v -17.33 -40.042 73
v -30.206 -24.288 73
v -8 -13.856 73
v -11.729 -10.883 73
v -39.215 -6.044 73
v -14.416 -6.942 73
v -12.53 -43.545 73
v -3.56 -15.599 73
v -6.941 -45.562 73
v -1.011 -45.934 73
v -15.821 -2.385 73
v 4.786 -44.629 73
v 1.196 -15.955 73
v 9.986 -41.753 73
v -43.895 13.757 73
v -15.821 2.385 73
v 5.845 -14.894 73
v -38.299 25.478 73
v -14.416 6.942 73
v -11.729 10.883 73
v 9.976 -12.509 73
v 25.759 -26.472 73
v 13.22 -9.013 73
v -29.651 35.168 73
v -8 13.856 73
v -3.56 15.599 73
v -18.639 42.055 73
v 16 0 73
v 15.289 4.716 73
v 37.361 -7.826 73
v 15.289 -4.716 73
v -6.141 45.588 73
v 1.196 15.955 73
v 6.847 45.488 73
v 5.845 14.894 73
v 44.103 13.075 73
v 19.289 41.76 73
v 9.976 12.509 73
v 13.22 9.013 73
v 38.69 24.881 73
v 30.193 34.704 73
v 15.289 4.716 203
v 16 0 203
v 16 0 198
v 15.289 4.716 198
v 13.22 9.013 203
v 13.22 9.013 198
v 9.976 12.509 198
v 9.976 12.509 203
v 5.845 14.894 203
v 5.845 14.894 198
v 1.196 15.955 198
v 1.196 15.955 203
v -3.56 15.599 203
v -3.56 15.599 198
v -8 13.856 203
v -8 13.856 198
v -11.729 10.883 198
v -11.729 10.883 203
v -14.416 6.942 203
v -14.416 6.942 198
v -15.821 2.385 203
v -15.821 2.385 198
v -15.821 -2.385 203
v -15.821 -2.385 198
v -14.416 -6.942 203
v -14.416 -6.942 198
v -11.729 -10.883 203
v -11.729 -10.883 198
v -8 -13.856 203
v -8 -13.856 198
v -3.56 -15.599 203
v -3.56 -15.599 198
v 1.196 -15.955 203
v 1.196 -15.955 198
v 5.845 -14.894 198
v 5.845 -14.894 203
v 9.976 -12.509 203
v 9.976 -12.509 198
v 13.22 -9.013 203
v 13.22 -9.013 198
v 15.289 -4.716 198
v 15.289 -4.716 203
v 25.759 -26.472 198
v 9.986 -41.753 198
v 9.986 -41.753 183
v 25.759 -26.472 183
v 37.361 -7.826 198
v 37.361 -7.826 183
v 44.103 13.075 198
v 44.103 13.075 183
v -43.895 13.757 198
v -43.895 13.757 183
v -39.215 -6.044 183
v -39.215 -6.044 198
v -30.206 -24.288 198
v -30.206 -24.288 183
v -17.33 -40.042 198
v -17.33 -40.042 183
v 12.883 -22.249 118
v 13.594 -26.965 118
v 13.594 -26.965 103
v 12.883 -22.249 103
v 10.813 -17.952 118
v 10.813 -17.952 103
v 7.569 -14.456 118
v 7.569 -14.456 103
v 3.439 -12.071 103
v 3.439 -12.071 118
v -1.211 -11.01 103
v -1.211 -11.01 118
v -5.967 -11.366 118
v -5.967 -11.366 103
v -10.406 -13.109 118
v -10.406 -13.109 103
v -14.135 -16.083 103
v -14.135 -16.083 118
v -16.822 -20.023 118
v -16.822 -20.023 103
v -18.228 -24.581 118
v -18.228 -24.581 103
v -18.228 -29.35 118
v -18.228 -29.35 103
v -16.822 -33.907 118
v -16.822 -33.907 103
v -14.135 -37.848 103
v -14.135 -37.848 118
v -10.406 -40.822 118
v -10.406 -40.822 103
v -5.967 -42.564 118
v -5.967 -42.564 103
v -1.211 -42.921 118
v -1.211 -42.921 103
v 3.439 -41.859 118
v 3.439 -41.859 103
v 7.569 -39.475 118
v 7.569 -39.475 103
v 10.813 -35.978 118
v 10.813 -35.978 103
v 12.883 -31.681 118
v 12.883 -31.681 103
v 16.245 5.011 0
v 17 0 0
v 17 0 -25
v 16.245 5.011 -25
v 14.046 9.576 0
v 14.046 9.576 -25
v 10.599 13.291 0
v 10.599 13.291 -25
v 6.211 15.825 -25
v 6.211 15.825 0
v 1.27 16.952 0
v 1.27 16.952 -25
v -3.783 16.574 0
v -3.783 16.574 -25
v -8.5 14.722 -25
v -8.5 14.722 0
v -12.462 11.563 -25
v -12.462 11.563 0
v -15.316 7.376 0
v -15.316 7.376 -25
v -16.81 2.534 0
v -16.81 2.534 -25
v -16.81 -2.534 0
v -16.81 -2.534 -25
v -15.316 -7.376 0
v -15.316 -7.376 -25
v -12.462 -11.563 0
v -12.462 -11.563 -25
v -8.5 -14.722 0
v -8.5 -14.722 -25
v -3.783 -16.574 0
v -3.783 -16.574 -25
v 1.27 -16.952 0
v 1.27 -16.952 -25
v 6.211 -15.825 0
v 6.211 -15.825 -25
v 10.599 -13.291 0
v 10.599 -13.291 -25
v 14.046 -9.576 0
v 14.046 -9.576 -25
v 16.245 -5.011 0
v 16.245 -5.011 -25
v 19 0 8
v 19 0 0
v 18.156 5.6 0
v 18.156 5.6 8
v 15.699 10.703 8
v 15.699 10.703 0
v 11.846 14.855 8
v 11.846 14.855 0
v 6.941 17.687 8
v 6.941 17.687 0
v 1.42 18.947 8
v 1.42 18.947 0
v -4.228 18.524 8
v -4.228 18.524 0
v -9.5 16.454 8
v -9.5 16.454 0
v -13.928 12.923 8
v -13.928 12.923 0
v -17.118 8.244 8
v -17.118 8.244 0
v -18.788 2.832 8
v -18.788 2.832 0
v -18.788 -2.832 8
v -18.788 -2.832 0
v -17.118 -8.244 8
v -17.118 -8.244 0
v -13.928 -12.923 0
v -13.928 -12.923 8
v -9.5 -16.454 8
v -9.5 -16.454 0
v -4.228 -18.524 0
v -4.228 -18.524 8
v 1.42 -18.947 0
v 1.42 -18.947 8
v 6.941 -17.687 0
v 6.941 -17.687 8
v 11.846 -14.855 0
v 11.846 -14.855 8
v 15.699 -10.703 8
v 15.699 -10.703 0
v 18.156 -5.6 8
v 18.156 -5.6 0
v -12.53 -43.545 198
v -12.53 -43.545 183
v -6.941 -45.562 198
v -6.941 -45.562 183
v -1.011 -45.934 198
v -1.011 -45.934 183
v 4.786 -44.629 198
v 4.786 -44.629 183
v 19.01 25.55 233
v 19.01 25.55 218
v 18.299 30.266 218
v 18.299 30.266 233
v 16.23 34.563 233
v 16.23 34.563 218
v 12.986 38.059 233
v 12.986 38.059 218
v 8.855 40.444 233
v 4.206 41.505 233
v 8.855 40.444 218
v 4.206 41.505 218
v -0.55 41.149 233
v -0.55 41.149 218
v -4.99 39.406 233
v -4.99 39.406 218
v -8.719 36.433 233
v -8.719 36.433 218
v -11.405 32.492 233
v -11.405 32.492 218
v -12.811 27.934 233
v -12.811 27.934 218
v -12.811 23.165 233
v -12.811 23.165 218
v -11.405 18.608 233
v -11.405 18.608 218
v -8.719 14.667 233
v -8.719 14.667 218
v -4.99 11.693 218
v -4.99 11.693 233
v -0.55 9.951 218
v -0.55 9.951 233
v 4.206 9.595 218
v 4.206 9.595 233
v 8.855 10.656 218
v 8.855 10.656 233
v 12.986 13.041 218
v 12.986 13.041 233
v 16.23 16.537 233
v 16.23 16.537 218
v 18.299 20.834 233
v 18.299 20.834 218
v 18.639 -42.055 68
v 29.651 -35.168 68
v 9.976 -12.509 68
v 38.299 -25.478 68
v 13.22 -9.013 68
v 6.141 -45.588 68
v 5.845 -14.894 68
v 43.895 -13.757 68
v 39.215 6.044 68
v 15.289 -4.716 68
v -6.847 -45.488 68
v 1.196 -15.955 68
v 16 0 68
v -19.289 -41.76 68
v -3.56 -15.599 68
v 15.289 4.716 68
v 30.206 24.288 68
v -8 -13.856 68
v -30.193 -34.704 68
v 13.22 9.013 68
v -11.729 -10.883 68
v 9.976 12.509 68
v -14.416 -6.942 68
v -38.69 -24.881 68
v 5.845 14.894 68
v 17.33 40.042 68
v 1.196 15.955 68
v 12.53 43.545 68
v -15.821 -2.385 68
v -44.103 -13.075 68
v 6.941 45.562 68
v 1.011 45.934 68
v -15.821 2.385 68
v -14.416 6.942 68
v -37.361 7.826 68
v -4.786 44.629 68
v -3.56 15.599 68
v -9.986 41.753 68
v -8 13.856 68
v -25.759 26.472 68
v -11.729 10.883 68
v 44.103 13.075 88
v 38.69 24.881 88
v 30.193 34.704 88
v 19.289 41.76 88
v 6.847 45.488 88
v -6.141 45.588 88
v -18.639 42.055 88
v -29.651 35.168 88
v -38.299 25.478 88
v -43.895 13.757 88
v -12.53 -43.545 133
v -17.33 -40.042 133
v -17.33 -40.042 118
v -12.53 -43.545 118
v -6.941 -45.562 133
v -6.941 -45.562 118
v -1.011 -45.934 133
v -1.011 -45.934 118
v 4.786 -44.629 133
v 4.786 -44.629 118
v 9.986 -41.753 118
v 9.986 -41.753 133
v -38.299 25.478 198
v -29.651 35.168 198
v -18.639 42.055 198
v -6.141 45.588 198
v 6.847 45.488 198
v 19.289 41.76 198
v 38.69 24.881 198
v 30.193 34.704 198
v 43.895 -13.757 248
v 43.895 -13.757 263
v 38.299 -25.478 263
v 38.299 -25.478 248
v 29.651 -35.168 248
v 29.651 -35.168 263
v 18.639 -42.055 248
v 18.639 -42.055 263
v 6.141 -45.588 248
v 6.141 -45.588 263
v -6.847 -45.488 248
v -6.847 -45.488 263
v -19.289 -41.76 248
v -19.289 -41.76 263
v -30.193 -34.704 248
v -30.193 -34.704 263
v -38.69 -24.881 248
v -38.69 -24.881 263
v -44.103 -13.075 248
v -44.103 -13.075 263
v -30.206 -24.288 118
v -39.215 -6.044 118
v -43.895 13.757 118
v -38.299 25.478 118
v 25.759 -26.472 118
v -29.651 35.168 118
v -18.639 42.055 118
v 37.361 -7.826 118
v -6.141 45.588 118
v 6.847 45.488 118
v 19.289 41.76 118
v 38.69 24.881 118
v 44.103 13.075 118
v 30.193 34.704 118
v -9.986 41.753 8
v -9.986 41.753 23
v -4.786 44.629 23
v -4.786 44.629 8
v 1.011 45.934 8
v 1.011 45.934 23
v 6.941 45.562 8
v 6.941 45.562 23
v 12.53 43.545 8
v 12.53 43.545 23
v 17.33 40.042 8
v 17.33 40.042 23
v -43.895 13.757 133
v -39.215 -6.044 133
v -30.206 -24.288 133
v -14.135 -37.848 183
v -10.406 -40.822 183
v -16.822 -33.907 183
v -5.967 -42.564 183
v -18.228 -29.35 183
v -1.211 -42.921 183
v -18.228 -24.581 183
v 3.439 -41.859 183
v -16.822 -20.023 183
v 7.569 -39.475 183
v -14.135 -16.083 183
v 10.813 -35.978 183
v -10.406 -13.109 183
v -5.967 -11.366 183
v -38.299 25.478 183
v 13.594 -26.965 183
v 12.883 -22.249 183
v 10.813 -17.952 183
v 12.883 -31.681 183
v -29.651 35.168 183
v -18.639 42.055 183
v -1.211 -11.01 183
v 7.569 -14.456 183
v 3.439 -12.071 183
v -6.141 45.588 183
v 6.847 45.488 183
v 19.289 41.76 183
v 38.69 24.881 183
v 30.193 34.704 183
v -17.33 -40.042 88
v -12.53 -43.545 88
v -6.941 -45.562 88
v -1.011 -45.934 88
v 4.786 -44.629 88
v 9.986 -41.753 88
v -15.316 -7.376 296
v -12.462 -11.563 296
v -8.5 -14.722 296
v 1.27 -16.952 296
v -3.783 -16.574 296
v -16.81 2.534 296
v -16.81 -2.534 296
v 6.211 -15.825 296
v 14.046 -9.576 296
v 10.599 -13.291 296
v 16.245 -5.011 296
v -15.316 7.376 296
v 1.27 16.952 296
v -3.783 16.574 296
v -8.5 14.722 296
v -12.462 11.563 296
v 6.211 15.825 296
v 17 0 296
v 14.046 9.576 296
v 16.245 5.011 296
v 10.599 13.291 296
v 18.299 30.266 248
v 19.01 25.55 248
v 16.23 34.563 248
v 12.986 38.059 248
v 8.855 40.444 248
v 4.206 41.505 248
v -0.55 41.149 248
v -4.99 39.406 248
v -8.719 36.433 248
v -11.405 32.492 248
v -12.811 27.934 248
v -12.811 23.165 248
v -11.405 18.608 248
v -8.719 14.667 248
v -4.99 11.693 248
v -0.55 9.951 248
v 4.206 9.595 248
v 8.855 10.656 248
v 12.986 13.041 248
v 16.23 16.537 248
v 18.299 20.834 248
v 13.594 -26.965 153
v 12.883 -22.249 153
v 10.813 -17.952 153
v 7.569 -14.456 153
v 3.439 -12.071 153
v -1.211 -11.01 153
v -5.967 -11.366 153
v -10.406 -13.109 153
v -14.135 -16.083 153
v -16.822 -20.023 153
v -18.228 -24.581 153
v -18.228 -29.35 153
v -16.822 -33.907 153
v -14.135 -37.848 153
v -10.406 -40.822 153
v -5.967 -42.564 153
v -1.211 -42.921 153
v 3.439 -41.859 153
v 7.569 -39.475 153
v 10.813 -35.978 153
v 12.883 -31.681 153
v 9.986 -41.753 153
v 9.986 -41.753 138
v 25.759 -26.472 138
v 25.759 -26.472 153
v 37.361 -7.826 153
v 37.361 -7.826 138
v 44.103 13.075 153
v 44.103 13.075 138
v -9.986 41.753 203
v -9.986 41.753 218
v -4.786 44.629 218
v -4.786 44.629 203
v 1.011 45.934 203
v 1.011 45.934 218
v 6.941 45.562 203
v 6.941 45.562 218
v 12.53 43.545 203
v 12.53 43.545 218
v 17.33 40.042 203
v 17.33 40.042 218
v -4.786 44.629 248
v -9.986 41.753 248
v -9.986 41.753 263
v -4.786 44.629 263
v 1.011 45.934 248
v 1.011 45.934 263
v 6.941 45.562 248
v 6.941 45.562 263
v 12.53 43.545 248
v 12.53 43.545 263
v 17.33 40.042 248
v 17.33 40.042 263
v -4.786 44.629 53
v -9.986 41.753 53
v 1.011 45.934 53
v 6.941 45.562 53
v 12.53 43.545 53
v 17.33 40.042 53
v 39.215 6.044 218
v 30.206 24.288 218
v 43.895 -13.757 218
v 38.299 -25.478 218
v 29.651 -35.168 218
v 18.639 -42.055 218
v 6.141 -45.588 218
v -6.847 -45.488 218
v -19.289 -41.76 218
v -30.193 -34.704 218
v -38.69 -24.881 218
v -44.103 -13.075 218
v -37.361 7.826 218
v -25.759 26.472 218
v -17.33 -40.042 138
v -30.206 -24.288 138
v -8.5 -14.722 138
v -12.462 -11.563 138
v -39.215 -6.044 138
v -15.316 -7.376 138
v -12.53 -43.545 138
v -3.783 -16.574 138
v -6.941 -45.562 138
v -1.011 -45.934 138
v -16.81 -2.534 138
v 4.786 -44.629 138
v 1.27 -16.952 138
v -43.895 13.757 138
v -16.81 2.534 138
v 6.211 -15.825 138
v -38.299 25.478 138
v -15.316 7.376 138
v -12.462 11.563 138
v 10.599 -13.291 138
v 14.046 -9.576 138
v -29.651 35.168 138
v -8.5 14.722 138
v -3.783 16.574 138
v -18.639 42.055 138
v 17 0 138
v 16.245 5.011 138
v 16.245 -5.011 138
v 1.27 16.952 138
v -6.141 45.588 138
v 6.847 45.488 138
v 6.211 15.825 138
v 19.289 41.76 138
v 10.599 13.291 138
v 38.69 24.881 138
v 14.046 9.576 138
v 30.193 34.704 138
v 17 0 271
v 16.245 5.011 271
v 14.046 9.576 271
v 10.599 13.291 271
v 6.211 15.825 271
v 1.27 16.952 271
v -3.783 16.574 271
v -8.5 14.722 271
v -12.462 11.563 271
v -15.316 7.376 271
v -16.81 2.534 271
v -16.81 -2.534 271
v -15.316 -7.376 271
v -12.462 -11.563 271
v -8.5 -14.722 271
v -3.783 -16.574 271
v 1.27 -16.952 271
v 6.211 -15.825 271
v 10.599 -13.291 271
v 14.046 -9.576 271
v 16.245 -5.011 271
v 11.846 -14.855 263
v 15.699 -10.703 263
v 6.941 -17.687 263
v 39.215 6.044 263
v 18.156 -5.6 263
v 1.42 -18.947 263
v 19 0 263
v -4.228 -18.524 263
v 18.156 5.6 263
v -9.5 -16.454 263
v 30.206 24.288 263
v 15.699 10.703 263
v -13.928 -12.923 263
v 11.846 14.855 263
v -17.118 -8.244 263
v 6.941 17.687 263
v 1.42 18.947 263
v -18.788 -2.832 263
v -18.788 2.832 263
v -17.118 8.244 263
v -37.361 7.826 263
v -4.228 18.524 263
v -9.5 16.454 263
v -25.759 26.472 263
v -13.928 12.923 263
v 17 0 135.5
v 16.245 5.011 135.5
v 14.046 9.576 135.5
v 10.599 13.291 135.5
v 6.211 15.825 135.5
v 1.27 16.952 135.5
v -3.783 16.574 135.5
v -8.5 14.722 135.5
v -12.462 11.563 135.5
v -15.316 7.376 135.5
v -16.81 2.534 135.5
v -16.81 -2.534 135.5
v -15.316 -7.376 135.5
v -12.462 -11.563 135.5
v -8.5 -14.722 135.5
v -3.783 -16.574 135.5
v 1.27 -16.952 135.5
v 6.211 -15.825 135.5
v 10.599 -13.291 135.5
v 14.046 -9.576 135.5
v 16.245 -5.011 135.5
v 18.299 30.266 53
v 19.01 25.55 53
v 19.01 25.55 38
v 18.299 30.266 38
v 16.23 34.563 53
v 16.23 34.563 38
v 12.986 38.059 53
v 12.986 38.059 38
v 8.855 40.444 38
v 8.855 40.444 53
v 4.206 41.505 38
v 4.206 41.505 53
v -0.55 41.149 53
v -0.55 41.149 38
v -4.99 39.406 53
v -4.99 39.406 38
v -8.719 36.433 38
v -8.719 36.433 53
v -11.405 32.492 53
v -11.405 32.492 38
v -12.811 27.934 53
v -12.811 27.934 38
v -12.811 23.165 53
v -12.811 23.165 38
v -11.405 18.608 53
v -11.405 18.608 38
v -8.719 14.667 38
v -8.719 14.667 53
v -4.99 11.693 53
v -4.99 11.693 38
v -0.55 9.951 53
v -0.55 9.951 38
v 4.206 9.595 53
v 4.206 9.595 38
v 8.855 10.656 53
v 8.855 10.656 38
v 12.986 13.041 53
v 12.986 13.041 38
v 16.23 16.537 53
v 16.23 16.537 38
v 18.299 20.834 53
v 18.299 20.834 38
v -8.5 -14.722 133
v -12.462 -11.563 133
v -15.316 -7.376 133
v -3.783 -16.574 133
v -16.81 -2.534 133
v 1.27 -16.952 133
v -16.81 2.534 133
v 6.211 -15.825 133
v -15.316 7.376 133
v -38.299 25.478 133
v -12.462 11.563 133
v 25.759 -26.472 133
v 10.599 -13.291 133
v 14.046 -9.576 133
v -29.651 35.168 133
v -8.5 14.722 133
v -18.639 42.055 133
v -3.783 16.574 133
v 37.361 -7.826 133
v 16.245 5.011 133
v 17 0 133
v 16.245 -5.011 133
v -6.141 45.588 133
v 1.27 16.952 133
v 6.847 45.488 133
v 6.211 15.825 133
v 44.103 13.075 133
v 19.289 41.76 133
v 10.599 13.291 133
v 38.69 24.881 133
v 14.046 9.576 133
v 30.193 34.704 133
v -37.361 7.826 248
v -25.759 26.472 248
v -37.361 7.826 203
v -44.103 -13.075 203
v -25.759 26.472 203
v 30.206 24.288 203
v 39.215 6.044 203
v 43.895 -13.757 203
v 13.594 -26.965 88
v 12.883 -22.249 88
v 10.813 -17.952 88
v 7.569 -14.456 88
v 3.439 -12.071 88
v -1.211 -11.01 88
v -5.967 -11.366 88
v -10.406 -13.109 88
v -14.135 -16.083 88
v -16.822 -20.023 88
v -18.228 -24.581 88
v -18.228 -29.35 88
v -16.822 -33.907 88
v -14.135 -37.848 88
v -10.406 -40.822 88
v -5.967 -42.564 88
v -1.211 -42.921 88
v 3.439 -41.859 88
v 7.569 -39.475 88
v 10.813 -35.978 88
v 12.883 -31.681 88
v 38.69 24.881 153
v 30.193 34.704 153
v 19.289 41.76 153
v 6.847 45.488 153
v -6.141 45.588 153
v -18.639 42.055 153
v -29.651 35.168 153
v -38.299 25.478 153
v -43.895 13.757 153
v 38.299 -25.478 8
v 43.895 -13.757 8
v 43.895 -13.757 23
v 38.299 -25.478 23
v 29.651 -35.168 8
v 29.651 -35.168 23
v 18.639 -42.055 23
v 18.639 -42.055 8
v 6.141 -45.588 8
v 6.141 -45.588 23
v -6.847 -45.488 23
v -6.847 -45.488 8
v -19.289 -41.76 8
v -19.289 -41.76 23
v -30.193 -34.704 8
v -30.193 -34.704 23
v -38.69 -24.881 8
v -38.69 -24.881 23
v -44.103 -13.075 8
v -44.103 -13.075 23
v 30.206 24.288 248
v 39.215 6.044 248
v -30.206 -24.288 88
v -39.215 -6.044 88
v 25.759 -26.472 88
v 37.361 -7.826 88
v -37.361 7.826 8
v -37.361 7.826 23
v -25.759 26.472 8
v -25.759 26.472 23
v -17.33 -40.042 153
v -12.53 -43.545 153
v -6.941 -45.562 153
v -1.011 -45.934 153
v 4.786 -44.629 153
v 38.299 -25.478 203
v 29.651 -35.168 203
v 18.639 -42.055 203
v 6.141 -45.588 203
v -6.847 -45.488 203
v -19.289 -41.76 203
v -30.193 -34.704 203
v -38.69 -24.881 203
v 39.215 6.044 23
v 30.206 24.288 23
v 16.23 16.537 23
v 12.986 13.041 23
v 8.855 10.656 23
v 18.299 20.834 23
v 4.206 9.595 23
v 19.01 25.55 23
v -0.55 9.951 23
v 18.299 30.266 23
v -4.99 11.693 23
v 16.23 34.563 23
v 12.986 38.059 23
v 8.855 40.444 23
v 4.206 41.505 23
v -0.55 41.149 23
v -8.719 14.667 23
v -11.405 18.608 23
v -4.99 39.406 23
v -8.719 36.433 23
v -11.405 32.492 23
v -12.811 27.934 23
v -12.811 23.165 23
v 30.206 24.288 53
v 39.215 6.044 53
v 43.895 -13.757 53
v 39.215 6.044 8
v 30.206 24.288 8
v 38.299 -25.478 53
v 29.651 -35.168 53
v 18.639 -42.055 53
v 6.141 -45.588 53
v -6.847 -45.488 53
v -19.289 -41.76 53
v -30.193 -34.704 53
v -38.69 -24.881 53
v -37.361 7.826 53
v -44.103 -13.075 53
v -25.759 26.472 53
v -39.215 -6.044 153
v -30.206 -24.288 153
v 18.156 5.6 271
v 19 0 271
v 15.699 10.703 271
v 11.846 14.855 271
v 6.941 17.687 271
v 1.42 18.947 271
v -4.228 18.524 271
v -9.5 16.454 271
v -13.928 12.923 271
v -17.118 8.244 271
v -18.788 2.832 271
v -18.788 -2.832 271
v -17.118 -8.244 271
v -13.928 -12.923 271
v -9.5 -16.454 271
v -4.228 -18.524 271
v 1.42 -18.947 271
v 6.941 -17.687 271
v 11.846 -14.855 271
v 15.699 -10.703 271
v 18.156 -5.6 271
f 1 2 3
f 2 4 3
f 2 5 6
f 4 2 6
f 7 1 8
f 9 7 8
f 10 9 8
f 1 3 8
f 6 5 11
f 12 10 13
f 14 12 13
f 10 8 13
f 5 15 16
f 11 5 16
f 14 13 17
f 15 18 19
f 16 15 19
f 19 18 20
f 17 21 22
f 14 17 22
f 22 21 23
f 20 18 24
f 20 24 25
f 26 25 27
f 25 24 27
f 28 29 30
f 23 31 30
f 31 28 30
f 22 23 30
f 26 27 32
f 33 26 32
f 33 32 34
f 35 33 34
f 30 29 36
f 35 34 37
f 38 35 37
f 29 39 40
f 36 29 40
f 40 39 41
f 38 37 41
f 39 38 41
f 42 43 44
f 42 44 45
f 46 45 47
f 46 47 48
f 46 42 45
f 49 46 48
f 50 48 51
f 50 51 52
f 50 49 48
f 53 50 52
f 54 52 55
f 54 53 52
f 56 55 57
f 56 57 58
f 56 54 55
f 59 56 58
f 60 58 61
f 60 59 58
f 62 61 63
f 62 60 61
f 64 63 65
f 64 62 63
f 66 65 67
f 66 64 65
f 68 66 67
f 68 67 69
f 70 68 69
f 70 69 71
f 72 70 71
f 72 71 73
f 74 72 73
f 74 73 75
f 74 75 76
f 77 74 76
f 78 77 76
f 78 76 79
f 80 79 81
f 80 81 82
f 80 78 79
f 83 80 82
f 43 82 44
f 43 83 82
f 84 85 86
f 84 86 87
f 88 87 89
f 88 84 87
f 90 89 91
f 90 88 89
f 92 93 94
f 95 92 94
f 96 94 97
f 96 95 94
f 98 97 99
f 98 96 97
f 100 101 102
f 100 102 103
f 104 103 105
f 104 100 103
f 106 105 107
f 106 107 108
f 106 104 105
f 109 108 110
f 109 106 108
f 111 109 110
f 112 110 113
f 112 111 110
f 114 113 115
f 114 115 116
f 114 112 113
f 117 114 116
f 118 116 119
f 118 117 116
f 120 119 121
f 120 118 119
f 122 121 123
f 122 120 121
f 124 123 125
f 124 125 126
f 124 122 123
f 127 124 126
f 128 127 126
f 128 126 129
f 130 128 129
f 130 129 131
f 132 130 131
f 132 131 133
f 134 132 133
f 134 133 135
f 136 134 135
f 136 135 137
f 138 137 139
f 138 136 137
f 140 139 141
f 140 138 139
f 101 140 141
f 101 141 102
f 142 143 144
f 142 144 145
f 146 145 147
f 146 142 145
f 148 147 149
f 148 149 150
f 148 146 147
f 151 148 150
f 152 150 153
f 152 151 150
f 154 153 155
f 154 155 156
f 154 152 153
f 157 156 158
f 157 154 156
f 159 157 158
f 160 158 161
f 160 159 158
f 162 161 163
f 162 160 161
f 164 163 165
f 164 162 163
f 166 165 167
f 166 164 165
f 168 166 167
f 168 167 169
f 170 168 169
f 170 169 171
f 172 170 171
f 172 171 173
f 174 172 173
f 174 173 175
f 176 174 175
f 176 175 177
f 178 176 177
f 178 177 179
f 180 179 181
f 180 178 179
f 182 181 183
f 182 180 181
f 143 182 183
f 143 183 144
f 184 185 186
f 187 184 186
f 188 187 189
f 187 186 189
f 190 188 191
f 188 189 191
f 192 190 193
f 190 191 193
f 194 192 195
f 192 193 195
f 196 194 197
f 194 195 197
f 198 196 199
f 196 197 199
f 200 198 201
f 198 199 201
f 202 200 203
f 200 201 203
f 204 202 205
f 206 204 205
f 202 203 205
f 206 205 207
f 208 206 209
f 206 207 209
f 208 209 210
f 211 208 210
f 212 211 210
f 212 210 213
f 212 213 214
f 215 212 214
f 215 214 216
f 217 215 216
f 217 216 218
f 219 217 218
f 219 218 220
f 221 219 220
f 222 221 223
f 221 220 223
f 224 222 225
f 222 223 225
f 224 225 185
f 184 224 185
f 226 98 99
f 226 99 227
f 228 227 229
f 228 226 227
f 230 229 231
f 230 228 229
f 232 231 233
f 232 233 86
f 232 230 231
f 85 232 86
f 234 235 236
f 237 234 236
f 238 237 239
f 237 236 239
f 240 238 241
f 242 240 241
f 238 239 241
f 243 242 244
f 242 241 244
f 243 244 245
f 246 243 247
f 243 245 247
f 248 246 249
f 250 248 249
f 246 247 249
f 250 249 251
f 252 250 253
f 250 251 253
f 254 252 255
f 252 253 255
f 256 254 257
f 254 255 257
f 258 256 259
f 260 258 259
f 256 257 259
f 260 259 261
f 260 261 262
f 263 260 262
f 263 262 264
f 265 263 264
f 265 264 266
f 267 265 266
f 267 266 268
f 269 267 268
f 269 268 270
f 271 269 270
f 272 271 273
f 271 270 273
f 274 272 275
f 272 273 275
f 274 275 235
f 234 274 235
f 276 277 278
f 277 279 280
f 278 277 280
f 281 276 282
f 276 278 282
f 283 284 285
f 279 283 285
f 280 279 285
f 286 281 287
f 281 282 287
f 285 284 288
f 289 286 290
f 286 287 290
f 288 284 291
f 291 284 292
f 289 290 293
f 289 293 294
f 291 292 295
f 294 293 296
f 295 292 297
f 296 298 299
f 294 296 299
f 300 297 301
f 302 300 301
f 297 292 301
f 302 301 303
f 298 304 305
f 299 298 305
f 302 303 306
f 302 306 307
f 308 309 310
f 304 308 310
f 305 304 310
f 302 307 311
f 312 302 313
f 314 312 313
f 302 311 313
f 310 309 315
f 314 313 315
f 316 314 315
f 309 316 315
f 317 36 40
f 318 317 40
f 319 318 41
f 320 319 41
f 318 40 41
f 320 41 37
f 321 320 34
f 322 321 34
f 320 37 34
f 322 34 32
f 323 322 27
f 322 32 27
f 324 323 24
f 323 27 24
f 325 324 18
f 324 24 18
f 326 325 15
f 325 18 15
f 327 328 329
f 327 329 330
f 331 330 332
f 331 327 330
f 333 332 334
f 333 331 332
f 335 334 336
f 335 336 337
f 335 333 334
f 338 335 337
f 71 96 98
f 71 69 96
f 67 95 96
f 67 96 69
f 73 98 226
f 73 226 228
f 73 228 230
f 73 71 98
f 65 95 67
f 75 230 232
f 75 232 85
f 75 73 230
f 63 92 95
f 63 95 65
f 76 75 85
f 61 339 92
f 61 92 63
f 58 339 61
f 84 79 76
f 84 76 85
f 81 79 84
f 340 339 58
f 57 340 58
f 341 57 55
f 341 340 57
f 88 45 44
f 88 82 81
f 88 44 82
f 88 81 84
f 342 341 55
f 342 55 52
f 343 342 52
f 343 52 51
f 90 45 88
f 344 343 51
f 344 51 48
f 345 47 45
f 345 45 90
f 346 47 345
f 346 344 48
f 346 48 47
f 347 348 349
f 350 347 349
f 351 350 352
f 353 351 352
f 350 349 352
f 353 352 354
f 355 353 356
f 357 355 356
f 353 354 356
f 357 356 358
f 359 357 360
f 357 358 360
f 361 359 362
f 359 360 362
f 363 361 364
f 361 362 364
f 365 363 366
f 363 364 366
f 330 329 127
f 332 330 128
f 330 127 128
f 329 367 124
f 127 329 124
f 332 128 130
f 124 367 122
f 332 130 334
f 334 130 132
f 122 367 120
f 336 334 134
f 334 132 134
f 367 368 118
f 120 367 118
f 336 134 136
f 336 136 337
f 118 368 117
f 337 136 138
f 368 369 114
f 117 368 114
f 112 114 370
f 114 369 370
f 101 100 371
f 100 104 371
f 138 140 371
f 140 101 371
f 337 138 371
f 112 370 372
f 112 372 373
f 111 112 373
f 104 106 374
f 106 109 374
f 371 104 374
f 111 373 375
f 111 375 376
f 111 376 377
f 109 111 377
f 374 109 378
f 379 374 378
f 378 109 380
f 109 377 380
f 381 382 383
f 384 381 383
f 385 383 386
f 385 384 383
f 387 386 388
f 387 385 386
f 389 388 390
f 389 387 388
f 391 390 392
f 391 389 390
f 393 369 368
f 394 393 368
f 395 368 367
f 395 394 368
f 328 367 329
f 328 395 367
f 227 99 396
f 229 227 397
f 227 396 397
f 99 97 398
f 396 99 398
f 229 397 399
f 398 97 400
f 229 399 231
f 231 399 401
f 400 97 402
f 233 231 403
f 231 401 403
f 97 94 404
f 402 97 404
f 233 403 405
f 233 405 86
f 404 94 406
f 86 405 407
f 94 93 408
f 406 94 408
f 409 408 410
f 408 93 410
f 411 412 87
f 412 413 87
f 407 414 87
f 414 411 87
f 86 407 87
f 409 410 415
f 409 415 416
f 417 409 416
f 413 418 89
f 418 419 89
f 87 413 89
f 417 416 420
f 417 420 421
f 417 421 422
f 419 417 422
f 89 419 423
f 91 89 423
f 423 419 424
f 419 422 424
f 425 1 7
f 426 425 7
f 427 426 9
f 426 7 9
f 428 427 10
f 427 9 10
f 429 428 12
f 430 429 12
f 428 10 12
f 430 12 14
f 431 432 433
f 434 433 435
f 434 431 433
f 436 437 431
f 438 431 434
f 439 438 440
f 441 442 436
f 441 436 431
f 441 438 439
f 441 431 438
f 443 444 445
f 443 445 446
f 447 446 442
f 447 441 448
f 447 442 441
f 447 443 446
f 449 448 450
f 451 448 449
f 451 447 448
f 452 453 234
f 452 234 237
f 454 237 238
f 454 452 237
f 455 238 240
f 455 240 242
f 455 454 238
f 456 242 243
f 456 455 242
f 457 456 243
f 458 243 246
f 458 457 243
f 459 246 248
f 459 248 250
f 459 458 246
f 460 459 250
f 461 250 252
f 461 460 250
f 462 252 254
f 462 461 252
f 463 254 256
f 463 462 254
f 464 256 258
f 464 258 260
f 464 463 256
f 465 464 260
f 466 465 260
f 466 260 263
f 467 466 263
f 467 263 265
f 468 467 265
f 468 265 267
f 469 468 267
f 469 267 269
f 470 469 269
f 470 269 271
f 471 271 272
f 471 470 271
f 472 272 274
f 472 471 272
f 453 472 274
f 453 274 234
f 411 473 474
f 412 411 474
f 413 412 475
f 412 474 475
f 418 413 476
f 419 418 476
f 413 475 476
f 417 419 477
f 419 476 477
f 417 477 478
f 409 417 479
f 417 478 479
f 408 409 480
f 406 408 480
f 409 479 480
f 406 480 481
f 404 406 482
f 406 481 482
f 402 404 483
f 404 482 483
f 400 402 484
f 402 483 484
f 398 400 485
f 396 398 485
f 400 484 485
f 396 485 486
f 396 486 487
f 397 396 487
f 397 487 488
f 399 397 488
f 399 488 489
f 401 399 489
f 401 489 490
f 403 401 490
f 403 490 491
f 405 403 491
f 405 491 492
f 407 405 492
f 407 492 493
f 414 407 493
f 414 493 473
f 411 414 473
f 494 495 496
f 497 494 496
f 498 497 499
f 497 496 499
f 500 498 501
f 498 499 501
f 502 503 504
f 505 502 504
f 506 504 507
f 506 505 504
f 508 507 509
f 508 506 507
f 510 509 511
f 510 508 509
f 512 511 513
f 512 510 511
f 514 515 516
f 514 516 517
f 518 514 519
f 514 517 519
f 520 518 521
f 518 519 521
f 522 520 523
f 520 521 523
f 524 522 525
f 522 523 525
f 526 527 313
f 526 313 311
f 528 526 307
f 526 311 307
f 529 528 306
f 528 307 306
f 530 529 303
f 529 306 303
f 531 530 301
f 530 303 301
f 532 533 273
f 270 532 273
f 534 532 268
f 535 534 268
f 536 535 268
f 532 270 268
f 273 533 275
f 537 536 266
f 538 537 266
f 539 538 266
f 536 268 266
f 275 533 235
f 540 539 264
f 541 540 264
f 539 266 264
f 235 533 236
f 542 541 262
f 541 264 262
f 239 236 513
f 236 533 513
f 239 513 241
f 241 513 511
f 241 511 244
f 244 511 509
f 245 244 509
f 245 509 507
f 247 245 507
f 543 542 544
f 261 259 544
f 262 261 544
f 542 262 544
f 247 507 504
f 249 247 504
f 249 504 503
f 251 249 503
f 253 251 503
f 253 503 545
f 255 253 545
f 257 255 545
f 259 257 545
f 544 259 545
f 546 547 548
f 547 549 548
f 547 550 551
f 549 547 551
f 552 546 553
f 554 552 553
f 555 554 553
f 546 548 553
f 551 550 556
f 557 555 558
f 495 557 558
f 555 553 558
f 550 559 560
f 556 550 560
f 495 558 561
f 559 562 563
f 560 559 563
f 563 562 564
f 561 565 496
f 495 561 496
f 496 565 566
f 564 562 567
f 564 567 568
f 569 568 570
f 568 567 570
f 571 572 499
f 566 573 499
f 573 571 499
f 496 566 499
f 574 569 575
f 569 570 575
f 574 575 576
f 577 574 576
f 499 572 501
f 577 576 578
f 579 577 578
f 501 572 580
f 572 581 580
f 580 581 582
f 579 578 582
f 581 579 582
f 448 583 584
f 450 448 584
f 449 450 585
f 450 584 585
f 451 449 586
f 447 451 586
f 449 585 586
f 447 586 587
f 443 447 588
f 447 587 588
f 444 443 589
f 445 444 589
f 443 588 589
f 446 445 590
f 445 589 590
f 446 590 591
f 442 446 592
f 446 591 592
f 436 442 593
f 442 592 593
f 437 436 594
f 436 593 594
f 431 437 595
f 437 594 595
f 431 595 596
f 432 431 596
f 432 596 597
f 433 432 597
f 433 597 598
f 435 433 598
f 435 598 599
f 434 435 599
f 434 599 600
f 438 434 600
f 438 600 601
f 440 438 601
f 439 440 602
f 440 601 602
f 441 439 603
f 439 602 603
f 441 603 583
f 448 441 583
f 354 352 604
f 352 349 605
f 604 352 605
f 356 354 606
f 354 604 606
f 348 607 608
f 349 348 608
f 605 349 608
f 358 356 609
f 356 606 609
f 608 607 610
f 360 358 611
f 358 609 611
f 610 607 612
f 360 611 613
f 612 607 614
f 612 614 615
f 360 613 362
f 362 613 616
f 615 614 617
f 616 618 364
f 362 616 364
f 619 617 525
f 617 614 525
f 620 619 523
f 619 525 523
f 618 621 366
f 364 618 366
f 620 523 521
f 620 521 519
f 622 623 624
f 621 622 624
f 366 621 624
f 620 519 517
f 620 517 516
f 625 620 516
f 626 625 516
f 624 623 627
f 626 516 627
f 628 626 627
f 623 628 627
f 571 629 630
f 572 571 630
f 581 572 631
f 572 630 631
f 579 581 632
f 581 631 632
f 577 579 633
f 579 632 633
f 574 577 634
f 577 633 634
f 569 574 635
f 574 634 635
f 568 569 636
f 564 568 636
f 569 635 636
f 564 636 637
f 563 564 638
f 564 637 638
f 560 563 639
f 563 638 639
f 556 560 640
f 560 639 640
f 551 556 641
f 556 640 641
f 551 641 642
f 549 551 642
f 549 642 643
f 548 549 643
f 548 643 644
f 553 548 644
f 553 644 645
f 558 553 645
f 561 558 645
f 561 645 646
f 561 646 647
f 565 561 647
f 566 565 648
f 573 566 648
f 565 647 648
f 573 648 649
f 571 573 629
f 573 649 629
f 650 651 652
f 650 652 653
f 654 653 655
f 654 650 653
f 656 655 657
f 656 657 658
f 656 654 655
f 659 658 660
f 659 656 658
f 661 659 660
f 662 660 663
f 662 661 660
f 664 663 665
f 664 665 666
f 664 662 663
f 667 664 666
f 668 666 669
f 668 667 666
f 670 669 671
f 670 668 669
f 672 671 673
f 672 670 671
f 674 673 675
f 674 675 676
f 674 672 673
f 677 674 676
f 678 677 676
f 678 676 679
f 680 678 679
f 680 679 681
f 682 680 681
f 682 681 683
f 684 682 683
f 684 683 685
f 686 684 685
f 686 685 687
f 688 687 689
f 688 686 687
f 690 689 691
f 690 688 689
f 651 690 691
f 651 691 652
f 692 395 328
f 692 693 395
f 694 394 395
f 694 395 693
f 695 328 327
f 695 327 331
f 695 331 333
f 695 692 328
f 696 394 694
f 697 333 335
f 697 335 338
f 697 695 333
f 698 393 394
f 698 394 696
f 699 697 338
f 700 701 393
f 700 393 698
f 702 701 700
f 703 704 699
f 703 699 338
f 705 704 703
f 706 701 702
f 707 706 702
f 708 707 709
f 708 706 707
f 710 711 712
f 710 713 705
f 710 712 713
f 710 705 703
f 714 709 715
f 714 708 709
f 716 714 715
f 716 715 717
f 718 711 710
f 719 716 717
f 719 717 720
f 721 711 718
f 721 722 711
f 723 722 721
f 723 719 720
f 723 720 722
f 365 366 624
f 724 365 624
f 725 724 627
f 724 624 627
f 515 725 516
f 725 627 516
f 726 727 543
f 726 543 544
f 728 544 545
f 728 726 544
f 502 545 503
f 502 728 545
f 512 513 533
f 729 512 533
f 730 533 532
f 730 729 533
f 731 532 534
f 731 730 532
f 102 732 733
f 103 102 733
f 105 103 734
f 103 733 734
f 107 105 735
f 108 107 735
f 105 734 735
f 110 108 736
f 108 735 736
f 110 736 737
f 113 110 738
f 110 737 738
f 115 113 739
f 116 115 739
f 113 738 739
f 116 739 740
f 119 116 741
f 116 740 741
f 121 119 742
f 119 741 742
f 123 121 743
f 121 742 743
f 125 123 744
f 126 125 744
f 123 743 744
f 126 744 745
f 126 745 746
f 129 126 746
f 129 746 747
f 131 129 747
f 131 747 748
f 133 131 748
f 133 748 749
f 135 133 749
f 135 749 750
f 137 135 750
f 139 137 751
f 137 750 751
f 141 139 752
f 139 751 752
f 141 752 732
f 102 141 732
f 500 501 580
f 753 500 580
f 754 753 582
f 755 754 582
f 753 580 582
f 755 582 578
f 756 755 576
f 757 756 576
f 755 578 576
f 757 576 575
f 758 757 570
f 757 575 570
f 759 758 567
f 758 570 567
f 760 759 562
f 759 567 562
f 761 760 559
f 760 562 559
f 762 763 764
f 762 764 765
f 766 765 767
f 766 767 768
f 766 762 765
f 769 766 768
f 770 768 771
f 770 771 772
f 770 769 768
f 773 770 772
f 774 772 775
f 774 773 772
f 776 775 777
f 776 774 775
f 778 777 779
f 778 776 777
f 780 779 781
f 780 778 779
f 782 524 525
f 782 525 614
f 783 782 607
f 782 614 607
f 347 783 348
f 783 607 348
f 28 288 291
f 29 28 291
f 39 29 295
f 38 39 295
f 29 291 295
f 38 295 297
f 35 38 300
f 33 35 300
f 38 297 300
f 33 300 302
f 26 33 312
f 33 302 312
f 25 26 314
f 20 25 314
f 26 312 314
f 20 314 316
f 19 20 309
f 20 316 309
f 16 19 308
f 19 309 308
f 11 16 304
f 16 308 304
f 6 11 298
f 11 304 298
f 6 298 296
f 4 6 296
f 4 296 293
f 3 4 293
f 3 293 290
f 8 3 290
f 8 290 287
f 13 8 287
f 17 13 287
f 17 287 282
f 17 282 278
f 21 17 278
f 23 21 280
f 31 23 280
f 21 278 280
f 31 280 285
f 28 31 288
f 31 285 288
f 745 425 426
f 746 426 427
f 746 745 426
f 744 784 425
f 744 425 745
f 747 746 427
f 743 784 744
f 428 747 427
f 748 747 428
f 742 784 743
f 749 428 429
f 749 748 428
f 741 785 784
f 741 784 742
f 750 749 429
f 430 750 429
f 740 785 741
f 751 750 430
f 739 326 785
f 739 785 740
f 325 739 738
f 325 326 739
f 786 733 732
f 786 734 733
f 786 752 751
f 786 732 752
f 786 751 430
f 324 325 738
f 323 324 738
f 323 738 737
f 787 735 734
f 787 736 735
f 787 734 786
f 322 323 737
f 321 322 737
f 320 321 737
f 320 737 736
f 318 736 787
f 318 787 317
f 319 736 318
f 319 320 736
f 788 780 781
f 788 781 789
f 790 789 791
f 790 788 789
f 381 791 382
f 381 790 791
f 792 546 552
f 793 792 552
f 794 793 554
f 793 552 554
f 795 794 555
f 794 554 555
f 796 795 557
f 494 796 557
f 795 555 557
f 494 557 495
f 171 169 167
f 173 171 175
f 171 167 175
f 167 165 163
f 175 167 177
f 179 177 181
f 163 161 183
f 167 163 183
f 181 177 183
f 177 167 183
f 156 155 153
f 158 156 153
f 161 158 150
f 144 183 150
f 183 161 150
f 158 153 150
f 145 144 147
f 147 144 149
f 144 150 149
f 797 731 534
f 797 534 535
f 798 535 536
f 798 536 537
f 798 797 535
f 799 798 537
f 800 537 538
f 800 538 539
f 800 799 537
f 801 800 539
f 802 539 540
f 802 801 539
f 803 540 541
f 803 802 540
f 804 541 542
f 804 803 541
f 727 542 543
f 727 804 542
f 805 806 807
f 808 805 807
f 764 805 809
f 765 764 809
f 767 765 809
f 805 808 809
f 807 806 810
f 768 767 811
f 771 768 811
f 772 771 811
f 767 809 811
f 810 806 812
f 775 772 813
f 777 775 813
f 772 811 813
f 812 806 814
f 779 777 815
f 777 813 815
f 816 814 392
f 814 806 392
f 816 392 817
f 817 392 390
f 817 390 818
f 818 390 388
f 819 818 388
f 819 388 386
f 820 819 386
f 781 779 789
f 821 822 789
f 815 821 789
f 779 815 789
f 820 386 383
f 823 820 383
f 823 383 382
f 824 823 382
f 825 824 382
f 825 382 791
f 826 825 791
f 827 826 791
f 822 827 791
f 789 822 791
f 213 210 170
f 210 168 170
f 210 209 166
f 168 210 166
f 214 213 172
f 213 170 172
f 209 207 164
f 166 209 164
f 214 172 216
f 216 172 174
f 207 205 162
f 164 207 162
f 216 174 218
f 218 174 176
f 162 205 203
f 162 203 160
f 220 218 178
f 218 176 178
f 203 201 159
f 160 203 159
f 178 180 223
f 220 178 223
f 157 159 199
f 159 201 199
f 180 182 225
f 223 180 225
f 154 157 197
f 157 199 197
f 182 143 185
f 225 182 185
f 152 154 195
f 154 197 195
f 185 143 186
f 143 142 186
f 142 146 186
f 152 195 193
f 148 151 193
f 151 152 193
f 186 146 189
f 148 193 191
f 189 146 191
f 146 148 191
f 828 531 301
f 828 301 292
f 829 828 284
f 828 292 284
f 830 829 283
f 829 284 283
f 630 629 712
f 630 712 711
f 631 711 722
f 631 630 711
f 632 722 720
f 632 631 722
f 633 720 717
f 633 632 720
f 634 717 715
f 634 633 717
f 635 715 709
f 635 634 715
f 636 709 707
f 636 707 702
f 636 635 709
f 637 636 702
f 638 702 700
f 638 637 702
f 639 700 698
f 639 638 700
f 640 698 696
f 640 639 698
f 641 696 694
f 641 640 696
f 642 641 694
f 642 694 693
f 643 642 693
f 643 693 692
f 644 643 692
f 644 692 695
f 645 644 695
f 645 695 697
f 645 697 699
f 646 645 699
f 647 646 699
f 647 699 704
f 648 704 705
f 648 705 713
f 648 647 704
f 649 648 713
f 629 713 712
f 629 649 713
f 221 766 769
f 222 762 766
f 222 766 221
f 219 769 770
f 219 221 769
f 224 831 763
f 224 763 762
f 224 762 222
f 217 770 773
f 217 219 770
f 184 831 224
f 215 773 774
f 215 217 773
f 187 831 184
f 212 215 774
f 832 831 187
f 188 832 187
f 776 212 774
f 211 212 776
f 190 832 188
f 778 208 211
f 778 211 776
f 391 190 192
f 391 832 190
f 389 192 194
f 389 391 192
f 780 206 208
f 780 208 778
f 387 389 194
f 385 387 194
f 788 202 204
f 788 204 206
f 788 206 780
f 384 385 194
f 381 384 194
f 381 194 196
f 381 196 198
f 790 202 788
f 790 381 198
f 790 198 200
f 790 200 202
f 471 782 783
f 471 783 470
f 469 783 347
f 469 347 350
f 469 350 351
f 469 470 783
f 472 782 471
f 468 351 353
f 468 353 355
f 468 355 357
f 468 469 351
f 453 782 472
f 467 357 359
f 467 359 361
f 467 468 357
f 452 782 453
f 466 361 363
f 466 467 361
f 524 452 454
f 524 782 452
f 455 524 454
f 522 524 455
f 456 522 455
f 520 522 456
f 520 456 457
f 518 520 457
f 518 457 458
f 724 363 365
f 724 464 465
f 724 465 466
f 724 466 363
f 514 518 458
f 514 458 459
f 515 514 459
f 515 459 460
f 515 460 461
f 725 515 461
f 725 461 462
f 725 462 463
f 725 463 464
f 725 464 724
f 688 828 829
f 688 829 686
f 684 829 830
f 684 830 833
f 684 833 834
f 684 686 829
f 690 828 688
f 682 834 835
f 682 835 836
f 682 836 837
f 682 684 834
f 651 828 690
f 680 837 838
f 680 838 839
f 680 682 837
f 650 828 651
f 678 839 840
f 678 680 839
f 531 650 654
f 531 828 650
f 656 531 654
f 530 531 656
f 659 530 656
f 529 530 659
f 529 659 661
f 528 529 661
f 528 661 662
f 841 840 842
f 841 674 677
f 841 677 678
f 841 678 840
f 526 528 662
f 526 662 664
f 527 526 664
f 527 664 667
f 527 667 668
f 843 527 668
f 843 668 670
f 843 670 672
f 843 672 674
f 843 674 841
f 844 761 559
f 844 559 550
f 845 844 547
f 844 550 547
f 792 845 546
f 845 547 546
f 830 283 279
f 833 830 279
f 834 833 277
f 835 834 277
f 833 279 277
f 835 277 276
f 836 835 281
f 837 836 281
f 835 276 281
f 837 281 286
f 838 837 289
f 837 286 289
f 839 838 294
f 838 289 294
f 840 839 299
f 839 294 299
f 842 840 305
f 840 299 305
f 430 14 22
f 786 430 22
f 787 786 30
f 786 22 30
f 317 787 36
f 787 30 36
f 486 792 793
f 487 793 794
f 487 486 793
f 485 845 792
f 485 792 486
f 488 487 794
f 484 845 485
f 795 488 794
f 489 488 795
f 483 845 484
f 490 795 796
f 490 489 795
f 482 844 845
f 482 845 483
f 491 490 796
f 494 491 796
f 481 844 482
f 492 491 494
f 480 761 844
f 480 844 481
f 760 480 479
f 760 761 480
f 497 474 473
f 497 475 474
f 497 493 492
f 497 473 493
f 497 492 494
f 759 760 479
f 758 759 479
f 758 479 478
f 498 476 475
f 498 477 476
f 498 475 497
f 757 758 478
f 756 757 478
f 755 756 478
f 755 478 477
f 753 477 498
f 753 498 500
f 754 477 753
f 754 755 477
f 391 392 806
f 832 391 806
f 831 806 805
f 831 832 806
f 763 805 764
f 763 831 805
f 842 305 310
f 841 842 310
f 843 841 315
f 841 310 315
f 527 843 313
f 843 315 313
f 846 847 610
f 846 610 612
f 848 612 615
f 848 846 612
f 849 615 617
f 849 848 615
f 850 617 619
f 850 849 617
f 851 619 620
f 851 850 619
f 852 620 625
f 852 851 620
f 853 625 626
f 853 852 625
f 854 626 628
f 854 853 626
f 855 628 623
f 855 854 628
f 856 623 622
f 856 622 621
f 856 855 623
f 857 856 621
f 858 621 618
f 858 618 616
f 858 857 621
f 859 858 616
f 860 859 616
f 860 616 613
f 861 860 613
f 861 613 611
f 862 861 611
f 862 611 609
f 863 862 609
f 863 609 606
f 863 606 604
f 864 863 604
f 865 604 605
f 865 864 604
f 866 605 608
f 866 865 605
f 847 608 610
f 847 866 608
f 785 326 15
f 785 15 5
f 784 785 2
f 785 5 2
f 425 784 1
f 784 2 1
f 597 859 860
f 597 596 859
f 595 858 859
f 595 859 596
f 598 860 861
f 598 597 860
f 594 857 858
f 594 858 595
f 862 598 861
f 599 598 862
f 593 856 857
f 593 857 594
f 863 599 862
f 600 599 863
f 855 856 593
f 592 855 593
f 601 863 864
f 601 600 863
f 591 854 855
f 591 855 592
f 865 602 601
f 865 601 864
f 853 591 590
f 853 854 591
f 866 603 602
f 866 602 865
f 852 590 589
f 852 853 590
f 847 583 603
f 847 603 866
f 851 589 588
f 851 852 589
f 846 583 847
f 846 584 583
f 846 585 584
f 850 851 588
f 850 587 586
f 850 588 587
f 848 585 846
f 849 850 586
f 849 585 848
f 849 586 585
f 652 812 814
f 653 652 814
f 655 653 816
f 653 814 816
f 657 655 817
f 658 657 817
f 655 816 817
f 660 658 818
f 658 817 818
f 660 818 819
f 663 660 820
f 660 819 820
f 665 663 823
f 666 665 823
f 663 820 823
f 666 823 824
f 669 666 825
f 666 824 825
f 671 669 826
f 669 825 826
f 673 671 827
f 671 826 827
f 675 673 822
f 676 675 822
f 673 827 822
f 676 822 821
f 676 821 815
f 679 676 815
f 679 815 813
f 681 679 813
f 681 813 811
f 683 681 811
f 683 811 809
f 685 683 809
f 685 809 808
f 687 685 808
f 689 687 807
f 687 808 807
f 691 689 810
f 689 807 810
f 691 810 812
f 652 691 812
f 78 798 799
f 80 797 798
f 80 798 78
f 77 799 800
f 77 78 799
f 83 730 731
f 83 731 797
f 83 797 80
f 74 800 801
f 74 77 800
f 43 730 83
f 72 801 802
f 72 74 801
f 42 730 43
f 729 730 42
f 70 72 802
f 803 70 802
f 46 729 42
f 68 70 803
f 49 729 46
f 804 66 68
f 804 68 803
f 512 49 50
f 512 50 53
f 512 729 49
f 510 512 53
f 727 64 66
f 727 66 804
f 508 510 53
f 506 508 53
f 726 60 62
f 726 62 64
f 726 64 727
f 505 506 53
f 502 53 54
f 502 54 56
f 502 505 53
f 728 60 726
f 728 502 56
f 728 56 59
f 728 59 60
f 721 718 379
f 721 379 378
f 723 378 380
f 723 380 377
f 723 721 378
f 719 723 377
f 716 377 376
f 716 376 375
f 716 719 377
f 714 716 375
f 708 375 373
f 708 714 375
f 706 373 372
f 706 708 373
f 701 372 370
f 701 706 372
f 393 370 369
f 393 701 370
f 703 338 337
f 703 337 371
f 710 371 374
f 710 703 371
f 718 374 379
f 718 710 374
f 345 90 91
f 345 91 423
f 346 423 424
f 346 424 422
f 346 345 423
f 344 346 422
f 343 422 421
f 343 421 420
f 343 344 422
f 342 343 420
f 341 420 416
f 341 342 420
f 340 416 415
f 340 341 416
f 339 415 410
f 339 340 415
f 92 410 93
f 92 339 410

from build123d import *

# Parameters (mm, degrees)
SKETCH1_R           = 17
BOSS_EXTRUDE1_DEPTH = 25
SKETCH1_3_R         = 19
BOSS_EXTRUDE2_DEPTH = 8
BOSS_EXTRUDE3_DEPTH = 15
SKETCH3_R           = 16
BOSS_EXTRUDE4_DEPTH = 15
SKETCH4_R           = 16
BOSS_EXTRUDE5_DEPTH = 5
BOSS_EXTRUDE6_DEPTH = 15
SKETCH6_R           = 16
BOSS_EXTRUDE7_DEPTH = 15
BOSS_EXTRUDE8_START = 2.5
SKETCH7_R           = 17
BOSS_EXTRUDE8_DEPTH = 2.5


with BuildPart() as part:
    # Sketch1 → Boss-Extrude1 (new body)
    with BuildSketch(Plane.XY):
        Circle(SKETCH1_R)
    extrude(amount=-BOSS_EXTRUDE1_DEPTH)

    # Sketch1<3> → Boss-Extrude2 (add)
    with BuildSketch(Plane.XY):
        Circle(SKETCH1_3_R)
    extrude(amount=BOSS_EXTRUDE2_DEPTH)

    # Sketch2 → Boss-Extrude3 (add)
    with BuildSketch(Plane.XY.offset(8)):
        with BuildLine():
            ThreePointArc((-9.986058572, 41.752758122), (3.989062652, 45.958951954), (17.330326456, 40.042300883))
            ThreePointArc((17.330326456, 40.042300883), (35.227782907, 15.421350298), (43.89459329, -13.757350031))
            ThreePointArc((43.89459329, -13.757350031), (-0.356861624, -45.998615738), (-44.102758556, -13.074658228))
            ThreePointArc((-44.102758556, -13.074658228), (-32.131083622, 17.504265061), (-9.986058572, 41.752758122))
        make_face()
    boss_extrude3 = extrude(amount=BOSS_EXTRUDE3_DEPTH)

    # Sketch3 → Boss-Extrude4 (add)
    with BuildSketch(Plane.XY.offset(23)):
        with Locations((3.010021098, 25.549805608)):
            Circle(SKETCH3_R)
    boss_extrude4 = extrude(amount=BOSS_EXTRUDE4_DEPTH)

    # Mirror1: Boss-Extrude3, Boss-Extrude4 across plane
    add(boss_extrude3.mirror(Plane(origin=(3.010021098, 25.549805608, 38), x_dir=(1, 0, 0), z_dir=(0, 0, 1))))
    add(boss_extrude4.mirror(Plane(origin=(3.010021098, 25.549805608, 38), x_dir=(1, 0, 0), z_dir=(0, 0, 1))))

    # Sketch4 → Boss-Extrude5 (add)
    with BuildSketch(Plane.XY.offset(68)):
        Circle(SKETCH4_R)
    extrude(amount=BOSS_EXTRUDE5_DEPTH)

    # Sketch5 → Boss-Extrude6 (add)
    with BuildSketch(Plane.XY.offset(73)):
        with BuildLine():
            ThreePointArc((-17.330326456, -40.042300883), (-3.989062652, -45.958951954), (9.986058572, -41.752758122))
            ThreePointArc((9.986058572, -41.752758122), (32.131083622, -17.504265061), (44.102758556, 13.074658228))
            ThreePointArc((44.102758556, 13.074658228), (0.356861624, 45.998615738), (-43.89459329, 13.757350031))
            ThreePointArc((-43.89459329, 13.757350031), (-35.227782907, -15.421350298), (-17.330326456, -40.042300883))
        make_face()
    boss_extrude6 = extrude(amount=BOSS_EXTRUDE6_DEPTH)

    # Sketch6 → Boss-Extrude7 (add)
    with BuildSketch(Plane.XY.offset(88)):
        with Locations((-2.406352883, -26.965307304)):
            Circle(SKETCH6_R)
    boss_extrude7 = extrude(amount=BOSS_EXTRUDE7_DEPTH)

    # Mirror2: Boss-Extrude6, Boss-Extrude7 across plane
    add(boss_extrude6.mirror(Plane(origin=(-2.406352883, -26.965307304, 103), x_dir=(1, 0, 0), z_dir=(0, 0, 1))))
    add(boss_extrude7.mirror(Plane(origin=(-2.406352883, -26.965307304, 103), x_dir=(1, 0, 0), z_dir=(0, 0, 1))))

    # Sketch7 → Boss-Extrude8 (add)
    with BuildSketch(Plane.XY.offset(133).offset(BOSS_EXTRUDE8_START)):
        Circle(SKETCH7_R)
    extrude(amount=-BOSS_EXTRUDE8_DEPTH)

    # Mirror3: part across plane


with BuildPart() as part_1:
    add(part.part)
    add(part.part.mirror(Plane.XY.offset(135.5)))


solid = part_1.part
